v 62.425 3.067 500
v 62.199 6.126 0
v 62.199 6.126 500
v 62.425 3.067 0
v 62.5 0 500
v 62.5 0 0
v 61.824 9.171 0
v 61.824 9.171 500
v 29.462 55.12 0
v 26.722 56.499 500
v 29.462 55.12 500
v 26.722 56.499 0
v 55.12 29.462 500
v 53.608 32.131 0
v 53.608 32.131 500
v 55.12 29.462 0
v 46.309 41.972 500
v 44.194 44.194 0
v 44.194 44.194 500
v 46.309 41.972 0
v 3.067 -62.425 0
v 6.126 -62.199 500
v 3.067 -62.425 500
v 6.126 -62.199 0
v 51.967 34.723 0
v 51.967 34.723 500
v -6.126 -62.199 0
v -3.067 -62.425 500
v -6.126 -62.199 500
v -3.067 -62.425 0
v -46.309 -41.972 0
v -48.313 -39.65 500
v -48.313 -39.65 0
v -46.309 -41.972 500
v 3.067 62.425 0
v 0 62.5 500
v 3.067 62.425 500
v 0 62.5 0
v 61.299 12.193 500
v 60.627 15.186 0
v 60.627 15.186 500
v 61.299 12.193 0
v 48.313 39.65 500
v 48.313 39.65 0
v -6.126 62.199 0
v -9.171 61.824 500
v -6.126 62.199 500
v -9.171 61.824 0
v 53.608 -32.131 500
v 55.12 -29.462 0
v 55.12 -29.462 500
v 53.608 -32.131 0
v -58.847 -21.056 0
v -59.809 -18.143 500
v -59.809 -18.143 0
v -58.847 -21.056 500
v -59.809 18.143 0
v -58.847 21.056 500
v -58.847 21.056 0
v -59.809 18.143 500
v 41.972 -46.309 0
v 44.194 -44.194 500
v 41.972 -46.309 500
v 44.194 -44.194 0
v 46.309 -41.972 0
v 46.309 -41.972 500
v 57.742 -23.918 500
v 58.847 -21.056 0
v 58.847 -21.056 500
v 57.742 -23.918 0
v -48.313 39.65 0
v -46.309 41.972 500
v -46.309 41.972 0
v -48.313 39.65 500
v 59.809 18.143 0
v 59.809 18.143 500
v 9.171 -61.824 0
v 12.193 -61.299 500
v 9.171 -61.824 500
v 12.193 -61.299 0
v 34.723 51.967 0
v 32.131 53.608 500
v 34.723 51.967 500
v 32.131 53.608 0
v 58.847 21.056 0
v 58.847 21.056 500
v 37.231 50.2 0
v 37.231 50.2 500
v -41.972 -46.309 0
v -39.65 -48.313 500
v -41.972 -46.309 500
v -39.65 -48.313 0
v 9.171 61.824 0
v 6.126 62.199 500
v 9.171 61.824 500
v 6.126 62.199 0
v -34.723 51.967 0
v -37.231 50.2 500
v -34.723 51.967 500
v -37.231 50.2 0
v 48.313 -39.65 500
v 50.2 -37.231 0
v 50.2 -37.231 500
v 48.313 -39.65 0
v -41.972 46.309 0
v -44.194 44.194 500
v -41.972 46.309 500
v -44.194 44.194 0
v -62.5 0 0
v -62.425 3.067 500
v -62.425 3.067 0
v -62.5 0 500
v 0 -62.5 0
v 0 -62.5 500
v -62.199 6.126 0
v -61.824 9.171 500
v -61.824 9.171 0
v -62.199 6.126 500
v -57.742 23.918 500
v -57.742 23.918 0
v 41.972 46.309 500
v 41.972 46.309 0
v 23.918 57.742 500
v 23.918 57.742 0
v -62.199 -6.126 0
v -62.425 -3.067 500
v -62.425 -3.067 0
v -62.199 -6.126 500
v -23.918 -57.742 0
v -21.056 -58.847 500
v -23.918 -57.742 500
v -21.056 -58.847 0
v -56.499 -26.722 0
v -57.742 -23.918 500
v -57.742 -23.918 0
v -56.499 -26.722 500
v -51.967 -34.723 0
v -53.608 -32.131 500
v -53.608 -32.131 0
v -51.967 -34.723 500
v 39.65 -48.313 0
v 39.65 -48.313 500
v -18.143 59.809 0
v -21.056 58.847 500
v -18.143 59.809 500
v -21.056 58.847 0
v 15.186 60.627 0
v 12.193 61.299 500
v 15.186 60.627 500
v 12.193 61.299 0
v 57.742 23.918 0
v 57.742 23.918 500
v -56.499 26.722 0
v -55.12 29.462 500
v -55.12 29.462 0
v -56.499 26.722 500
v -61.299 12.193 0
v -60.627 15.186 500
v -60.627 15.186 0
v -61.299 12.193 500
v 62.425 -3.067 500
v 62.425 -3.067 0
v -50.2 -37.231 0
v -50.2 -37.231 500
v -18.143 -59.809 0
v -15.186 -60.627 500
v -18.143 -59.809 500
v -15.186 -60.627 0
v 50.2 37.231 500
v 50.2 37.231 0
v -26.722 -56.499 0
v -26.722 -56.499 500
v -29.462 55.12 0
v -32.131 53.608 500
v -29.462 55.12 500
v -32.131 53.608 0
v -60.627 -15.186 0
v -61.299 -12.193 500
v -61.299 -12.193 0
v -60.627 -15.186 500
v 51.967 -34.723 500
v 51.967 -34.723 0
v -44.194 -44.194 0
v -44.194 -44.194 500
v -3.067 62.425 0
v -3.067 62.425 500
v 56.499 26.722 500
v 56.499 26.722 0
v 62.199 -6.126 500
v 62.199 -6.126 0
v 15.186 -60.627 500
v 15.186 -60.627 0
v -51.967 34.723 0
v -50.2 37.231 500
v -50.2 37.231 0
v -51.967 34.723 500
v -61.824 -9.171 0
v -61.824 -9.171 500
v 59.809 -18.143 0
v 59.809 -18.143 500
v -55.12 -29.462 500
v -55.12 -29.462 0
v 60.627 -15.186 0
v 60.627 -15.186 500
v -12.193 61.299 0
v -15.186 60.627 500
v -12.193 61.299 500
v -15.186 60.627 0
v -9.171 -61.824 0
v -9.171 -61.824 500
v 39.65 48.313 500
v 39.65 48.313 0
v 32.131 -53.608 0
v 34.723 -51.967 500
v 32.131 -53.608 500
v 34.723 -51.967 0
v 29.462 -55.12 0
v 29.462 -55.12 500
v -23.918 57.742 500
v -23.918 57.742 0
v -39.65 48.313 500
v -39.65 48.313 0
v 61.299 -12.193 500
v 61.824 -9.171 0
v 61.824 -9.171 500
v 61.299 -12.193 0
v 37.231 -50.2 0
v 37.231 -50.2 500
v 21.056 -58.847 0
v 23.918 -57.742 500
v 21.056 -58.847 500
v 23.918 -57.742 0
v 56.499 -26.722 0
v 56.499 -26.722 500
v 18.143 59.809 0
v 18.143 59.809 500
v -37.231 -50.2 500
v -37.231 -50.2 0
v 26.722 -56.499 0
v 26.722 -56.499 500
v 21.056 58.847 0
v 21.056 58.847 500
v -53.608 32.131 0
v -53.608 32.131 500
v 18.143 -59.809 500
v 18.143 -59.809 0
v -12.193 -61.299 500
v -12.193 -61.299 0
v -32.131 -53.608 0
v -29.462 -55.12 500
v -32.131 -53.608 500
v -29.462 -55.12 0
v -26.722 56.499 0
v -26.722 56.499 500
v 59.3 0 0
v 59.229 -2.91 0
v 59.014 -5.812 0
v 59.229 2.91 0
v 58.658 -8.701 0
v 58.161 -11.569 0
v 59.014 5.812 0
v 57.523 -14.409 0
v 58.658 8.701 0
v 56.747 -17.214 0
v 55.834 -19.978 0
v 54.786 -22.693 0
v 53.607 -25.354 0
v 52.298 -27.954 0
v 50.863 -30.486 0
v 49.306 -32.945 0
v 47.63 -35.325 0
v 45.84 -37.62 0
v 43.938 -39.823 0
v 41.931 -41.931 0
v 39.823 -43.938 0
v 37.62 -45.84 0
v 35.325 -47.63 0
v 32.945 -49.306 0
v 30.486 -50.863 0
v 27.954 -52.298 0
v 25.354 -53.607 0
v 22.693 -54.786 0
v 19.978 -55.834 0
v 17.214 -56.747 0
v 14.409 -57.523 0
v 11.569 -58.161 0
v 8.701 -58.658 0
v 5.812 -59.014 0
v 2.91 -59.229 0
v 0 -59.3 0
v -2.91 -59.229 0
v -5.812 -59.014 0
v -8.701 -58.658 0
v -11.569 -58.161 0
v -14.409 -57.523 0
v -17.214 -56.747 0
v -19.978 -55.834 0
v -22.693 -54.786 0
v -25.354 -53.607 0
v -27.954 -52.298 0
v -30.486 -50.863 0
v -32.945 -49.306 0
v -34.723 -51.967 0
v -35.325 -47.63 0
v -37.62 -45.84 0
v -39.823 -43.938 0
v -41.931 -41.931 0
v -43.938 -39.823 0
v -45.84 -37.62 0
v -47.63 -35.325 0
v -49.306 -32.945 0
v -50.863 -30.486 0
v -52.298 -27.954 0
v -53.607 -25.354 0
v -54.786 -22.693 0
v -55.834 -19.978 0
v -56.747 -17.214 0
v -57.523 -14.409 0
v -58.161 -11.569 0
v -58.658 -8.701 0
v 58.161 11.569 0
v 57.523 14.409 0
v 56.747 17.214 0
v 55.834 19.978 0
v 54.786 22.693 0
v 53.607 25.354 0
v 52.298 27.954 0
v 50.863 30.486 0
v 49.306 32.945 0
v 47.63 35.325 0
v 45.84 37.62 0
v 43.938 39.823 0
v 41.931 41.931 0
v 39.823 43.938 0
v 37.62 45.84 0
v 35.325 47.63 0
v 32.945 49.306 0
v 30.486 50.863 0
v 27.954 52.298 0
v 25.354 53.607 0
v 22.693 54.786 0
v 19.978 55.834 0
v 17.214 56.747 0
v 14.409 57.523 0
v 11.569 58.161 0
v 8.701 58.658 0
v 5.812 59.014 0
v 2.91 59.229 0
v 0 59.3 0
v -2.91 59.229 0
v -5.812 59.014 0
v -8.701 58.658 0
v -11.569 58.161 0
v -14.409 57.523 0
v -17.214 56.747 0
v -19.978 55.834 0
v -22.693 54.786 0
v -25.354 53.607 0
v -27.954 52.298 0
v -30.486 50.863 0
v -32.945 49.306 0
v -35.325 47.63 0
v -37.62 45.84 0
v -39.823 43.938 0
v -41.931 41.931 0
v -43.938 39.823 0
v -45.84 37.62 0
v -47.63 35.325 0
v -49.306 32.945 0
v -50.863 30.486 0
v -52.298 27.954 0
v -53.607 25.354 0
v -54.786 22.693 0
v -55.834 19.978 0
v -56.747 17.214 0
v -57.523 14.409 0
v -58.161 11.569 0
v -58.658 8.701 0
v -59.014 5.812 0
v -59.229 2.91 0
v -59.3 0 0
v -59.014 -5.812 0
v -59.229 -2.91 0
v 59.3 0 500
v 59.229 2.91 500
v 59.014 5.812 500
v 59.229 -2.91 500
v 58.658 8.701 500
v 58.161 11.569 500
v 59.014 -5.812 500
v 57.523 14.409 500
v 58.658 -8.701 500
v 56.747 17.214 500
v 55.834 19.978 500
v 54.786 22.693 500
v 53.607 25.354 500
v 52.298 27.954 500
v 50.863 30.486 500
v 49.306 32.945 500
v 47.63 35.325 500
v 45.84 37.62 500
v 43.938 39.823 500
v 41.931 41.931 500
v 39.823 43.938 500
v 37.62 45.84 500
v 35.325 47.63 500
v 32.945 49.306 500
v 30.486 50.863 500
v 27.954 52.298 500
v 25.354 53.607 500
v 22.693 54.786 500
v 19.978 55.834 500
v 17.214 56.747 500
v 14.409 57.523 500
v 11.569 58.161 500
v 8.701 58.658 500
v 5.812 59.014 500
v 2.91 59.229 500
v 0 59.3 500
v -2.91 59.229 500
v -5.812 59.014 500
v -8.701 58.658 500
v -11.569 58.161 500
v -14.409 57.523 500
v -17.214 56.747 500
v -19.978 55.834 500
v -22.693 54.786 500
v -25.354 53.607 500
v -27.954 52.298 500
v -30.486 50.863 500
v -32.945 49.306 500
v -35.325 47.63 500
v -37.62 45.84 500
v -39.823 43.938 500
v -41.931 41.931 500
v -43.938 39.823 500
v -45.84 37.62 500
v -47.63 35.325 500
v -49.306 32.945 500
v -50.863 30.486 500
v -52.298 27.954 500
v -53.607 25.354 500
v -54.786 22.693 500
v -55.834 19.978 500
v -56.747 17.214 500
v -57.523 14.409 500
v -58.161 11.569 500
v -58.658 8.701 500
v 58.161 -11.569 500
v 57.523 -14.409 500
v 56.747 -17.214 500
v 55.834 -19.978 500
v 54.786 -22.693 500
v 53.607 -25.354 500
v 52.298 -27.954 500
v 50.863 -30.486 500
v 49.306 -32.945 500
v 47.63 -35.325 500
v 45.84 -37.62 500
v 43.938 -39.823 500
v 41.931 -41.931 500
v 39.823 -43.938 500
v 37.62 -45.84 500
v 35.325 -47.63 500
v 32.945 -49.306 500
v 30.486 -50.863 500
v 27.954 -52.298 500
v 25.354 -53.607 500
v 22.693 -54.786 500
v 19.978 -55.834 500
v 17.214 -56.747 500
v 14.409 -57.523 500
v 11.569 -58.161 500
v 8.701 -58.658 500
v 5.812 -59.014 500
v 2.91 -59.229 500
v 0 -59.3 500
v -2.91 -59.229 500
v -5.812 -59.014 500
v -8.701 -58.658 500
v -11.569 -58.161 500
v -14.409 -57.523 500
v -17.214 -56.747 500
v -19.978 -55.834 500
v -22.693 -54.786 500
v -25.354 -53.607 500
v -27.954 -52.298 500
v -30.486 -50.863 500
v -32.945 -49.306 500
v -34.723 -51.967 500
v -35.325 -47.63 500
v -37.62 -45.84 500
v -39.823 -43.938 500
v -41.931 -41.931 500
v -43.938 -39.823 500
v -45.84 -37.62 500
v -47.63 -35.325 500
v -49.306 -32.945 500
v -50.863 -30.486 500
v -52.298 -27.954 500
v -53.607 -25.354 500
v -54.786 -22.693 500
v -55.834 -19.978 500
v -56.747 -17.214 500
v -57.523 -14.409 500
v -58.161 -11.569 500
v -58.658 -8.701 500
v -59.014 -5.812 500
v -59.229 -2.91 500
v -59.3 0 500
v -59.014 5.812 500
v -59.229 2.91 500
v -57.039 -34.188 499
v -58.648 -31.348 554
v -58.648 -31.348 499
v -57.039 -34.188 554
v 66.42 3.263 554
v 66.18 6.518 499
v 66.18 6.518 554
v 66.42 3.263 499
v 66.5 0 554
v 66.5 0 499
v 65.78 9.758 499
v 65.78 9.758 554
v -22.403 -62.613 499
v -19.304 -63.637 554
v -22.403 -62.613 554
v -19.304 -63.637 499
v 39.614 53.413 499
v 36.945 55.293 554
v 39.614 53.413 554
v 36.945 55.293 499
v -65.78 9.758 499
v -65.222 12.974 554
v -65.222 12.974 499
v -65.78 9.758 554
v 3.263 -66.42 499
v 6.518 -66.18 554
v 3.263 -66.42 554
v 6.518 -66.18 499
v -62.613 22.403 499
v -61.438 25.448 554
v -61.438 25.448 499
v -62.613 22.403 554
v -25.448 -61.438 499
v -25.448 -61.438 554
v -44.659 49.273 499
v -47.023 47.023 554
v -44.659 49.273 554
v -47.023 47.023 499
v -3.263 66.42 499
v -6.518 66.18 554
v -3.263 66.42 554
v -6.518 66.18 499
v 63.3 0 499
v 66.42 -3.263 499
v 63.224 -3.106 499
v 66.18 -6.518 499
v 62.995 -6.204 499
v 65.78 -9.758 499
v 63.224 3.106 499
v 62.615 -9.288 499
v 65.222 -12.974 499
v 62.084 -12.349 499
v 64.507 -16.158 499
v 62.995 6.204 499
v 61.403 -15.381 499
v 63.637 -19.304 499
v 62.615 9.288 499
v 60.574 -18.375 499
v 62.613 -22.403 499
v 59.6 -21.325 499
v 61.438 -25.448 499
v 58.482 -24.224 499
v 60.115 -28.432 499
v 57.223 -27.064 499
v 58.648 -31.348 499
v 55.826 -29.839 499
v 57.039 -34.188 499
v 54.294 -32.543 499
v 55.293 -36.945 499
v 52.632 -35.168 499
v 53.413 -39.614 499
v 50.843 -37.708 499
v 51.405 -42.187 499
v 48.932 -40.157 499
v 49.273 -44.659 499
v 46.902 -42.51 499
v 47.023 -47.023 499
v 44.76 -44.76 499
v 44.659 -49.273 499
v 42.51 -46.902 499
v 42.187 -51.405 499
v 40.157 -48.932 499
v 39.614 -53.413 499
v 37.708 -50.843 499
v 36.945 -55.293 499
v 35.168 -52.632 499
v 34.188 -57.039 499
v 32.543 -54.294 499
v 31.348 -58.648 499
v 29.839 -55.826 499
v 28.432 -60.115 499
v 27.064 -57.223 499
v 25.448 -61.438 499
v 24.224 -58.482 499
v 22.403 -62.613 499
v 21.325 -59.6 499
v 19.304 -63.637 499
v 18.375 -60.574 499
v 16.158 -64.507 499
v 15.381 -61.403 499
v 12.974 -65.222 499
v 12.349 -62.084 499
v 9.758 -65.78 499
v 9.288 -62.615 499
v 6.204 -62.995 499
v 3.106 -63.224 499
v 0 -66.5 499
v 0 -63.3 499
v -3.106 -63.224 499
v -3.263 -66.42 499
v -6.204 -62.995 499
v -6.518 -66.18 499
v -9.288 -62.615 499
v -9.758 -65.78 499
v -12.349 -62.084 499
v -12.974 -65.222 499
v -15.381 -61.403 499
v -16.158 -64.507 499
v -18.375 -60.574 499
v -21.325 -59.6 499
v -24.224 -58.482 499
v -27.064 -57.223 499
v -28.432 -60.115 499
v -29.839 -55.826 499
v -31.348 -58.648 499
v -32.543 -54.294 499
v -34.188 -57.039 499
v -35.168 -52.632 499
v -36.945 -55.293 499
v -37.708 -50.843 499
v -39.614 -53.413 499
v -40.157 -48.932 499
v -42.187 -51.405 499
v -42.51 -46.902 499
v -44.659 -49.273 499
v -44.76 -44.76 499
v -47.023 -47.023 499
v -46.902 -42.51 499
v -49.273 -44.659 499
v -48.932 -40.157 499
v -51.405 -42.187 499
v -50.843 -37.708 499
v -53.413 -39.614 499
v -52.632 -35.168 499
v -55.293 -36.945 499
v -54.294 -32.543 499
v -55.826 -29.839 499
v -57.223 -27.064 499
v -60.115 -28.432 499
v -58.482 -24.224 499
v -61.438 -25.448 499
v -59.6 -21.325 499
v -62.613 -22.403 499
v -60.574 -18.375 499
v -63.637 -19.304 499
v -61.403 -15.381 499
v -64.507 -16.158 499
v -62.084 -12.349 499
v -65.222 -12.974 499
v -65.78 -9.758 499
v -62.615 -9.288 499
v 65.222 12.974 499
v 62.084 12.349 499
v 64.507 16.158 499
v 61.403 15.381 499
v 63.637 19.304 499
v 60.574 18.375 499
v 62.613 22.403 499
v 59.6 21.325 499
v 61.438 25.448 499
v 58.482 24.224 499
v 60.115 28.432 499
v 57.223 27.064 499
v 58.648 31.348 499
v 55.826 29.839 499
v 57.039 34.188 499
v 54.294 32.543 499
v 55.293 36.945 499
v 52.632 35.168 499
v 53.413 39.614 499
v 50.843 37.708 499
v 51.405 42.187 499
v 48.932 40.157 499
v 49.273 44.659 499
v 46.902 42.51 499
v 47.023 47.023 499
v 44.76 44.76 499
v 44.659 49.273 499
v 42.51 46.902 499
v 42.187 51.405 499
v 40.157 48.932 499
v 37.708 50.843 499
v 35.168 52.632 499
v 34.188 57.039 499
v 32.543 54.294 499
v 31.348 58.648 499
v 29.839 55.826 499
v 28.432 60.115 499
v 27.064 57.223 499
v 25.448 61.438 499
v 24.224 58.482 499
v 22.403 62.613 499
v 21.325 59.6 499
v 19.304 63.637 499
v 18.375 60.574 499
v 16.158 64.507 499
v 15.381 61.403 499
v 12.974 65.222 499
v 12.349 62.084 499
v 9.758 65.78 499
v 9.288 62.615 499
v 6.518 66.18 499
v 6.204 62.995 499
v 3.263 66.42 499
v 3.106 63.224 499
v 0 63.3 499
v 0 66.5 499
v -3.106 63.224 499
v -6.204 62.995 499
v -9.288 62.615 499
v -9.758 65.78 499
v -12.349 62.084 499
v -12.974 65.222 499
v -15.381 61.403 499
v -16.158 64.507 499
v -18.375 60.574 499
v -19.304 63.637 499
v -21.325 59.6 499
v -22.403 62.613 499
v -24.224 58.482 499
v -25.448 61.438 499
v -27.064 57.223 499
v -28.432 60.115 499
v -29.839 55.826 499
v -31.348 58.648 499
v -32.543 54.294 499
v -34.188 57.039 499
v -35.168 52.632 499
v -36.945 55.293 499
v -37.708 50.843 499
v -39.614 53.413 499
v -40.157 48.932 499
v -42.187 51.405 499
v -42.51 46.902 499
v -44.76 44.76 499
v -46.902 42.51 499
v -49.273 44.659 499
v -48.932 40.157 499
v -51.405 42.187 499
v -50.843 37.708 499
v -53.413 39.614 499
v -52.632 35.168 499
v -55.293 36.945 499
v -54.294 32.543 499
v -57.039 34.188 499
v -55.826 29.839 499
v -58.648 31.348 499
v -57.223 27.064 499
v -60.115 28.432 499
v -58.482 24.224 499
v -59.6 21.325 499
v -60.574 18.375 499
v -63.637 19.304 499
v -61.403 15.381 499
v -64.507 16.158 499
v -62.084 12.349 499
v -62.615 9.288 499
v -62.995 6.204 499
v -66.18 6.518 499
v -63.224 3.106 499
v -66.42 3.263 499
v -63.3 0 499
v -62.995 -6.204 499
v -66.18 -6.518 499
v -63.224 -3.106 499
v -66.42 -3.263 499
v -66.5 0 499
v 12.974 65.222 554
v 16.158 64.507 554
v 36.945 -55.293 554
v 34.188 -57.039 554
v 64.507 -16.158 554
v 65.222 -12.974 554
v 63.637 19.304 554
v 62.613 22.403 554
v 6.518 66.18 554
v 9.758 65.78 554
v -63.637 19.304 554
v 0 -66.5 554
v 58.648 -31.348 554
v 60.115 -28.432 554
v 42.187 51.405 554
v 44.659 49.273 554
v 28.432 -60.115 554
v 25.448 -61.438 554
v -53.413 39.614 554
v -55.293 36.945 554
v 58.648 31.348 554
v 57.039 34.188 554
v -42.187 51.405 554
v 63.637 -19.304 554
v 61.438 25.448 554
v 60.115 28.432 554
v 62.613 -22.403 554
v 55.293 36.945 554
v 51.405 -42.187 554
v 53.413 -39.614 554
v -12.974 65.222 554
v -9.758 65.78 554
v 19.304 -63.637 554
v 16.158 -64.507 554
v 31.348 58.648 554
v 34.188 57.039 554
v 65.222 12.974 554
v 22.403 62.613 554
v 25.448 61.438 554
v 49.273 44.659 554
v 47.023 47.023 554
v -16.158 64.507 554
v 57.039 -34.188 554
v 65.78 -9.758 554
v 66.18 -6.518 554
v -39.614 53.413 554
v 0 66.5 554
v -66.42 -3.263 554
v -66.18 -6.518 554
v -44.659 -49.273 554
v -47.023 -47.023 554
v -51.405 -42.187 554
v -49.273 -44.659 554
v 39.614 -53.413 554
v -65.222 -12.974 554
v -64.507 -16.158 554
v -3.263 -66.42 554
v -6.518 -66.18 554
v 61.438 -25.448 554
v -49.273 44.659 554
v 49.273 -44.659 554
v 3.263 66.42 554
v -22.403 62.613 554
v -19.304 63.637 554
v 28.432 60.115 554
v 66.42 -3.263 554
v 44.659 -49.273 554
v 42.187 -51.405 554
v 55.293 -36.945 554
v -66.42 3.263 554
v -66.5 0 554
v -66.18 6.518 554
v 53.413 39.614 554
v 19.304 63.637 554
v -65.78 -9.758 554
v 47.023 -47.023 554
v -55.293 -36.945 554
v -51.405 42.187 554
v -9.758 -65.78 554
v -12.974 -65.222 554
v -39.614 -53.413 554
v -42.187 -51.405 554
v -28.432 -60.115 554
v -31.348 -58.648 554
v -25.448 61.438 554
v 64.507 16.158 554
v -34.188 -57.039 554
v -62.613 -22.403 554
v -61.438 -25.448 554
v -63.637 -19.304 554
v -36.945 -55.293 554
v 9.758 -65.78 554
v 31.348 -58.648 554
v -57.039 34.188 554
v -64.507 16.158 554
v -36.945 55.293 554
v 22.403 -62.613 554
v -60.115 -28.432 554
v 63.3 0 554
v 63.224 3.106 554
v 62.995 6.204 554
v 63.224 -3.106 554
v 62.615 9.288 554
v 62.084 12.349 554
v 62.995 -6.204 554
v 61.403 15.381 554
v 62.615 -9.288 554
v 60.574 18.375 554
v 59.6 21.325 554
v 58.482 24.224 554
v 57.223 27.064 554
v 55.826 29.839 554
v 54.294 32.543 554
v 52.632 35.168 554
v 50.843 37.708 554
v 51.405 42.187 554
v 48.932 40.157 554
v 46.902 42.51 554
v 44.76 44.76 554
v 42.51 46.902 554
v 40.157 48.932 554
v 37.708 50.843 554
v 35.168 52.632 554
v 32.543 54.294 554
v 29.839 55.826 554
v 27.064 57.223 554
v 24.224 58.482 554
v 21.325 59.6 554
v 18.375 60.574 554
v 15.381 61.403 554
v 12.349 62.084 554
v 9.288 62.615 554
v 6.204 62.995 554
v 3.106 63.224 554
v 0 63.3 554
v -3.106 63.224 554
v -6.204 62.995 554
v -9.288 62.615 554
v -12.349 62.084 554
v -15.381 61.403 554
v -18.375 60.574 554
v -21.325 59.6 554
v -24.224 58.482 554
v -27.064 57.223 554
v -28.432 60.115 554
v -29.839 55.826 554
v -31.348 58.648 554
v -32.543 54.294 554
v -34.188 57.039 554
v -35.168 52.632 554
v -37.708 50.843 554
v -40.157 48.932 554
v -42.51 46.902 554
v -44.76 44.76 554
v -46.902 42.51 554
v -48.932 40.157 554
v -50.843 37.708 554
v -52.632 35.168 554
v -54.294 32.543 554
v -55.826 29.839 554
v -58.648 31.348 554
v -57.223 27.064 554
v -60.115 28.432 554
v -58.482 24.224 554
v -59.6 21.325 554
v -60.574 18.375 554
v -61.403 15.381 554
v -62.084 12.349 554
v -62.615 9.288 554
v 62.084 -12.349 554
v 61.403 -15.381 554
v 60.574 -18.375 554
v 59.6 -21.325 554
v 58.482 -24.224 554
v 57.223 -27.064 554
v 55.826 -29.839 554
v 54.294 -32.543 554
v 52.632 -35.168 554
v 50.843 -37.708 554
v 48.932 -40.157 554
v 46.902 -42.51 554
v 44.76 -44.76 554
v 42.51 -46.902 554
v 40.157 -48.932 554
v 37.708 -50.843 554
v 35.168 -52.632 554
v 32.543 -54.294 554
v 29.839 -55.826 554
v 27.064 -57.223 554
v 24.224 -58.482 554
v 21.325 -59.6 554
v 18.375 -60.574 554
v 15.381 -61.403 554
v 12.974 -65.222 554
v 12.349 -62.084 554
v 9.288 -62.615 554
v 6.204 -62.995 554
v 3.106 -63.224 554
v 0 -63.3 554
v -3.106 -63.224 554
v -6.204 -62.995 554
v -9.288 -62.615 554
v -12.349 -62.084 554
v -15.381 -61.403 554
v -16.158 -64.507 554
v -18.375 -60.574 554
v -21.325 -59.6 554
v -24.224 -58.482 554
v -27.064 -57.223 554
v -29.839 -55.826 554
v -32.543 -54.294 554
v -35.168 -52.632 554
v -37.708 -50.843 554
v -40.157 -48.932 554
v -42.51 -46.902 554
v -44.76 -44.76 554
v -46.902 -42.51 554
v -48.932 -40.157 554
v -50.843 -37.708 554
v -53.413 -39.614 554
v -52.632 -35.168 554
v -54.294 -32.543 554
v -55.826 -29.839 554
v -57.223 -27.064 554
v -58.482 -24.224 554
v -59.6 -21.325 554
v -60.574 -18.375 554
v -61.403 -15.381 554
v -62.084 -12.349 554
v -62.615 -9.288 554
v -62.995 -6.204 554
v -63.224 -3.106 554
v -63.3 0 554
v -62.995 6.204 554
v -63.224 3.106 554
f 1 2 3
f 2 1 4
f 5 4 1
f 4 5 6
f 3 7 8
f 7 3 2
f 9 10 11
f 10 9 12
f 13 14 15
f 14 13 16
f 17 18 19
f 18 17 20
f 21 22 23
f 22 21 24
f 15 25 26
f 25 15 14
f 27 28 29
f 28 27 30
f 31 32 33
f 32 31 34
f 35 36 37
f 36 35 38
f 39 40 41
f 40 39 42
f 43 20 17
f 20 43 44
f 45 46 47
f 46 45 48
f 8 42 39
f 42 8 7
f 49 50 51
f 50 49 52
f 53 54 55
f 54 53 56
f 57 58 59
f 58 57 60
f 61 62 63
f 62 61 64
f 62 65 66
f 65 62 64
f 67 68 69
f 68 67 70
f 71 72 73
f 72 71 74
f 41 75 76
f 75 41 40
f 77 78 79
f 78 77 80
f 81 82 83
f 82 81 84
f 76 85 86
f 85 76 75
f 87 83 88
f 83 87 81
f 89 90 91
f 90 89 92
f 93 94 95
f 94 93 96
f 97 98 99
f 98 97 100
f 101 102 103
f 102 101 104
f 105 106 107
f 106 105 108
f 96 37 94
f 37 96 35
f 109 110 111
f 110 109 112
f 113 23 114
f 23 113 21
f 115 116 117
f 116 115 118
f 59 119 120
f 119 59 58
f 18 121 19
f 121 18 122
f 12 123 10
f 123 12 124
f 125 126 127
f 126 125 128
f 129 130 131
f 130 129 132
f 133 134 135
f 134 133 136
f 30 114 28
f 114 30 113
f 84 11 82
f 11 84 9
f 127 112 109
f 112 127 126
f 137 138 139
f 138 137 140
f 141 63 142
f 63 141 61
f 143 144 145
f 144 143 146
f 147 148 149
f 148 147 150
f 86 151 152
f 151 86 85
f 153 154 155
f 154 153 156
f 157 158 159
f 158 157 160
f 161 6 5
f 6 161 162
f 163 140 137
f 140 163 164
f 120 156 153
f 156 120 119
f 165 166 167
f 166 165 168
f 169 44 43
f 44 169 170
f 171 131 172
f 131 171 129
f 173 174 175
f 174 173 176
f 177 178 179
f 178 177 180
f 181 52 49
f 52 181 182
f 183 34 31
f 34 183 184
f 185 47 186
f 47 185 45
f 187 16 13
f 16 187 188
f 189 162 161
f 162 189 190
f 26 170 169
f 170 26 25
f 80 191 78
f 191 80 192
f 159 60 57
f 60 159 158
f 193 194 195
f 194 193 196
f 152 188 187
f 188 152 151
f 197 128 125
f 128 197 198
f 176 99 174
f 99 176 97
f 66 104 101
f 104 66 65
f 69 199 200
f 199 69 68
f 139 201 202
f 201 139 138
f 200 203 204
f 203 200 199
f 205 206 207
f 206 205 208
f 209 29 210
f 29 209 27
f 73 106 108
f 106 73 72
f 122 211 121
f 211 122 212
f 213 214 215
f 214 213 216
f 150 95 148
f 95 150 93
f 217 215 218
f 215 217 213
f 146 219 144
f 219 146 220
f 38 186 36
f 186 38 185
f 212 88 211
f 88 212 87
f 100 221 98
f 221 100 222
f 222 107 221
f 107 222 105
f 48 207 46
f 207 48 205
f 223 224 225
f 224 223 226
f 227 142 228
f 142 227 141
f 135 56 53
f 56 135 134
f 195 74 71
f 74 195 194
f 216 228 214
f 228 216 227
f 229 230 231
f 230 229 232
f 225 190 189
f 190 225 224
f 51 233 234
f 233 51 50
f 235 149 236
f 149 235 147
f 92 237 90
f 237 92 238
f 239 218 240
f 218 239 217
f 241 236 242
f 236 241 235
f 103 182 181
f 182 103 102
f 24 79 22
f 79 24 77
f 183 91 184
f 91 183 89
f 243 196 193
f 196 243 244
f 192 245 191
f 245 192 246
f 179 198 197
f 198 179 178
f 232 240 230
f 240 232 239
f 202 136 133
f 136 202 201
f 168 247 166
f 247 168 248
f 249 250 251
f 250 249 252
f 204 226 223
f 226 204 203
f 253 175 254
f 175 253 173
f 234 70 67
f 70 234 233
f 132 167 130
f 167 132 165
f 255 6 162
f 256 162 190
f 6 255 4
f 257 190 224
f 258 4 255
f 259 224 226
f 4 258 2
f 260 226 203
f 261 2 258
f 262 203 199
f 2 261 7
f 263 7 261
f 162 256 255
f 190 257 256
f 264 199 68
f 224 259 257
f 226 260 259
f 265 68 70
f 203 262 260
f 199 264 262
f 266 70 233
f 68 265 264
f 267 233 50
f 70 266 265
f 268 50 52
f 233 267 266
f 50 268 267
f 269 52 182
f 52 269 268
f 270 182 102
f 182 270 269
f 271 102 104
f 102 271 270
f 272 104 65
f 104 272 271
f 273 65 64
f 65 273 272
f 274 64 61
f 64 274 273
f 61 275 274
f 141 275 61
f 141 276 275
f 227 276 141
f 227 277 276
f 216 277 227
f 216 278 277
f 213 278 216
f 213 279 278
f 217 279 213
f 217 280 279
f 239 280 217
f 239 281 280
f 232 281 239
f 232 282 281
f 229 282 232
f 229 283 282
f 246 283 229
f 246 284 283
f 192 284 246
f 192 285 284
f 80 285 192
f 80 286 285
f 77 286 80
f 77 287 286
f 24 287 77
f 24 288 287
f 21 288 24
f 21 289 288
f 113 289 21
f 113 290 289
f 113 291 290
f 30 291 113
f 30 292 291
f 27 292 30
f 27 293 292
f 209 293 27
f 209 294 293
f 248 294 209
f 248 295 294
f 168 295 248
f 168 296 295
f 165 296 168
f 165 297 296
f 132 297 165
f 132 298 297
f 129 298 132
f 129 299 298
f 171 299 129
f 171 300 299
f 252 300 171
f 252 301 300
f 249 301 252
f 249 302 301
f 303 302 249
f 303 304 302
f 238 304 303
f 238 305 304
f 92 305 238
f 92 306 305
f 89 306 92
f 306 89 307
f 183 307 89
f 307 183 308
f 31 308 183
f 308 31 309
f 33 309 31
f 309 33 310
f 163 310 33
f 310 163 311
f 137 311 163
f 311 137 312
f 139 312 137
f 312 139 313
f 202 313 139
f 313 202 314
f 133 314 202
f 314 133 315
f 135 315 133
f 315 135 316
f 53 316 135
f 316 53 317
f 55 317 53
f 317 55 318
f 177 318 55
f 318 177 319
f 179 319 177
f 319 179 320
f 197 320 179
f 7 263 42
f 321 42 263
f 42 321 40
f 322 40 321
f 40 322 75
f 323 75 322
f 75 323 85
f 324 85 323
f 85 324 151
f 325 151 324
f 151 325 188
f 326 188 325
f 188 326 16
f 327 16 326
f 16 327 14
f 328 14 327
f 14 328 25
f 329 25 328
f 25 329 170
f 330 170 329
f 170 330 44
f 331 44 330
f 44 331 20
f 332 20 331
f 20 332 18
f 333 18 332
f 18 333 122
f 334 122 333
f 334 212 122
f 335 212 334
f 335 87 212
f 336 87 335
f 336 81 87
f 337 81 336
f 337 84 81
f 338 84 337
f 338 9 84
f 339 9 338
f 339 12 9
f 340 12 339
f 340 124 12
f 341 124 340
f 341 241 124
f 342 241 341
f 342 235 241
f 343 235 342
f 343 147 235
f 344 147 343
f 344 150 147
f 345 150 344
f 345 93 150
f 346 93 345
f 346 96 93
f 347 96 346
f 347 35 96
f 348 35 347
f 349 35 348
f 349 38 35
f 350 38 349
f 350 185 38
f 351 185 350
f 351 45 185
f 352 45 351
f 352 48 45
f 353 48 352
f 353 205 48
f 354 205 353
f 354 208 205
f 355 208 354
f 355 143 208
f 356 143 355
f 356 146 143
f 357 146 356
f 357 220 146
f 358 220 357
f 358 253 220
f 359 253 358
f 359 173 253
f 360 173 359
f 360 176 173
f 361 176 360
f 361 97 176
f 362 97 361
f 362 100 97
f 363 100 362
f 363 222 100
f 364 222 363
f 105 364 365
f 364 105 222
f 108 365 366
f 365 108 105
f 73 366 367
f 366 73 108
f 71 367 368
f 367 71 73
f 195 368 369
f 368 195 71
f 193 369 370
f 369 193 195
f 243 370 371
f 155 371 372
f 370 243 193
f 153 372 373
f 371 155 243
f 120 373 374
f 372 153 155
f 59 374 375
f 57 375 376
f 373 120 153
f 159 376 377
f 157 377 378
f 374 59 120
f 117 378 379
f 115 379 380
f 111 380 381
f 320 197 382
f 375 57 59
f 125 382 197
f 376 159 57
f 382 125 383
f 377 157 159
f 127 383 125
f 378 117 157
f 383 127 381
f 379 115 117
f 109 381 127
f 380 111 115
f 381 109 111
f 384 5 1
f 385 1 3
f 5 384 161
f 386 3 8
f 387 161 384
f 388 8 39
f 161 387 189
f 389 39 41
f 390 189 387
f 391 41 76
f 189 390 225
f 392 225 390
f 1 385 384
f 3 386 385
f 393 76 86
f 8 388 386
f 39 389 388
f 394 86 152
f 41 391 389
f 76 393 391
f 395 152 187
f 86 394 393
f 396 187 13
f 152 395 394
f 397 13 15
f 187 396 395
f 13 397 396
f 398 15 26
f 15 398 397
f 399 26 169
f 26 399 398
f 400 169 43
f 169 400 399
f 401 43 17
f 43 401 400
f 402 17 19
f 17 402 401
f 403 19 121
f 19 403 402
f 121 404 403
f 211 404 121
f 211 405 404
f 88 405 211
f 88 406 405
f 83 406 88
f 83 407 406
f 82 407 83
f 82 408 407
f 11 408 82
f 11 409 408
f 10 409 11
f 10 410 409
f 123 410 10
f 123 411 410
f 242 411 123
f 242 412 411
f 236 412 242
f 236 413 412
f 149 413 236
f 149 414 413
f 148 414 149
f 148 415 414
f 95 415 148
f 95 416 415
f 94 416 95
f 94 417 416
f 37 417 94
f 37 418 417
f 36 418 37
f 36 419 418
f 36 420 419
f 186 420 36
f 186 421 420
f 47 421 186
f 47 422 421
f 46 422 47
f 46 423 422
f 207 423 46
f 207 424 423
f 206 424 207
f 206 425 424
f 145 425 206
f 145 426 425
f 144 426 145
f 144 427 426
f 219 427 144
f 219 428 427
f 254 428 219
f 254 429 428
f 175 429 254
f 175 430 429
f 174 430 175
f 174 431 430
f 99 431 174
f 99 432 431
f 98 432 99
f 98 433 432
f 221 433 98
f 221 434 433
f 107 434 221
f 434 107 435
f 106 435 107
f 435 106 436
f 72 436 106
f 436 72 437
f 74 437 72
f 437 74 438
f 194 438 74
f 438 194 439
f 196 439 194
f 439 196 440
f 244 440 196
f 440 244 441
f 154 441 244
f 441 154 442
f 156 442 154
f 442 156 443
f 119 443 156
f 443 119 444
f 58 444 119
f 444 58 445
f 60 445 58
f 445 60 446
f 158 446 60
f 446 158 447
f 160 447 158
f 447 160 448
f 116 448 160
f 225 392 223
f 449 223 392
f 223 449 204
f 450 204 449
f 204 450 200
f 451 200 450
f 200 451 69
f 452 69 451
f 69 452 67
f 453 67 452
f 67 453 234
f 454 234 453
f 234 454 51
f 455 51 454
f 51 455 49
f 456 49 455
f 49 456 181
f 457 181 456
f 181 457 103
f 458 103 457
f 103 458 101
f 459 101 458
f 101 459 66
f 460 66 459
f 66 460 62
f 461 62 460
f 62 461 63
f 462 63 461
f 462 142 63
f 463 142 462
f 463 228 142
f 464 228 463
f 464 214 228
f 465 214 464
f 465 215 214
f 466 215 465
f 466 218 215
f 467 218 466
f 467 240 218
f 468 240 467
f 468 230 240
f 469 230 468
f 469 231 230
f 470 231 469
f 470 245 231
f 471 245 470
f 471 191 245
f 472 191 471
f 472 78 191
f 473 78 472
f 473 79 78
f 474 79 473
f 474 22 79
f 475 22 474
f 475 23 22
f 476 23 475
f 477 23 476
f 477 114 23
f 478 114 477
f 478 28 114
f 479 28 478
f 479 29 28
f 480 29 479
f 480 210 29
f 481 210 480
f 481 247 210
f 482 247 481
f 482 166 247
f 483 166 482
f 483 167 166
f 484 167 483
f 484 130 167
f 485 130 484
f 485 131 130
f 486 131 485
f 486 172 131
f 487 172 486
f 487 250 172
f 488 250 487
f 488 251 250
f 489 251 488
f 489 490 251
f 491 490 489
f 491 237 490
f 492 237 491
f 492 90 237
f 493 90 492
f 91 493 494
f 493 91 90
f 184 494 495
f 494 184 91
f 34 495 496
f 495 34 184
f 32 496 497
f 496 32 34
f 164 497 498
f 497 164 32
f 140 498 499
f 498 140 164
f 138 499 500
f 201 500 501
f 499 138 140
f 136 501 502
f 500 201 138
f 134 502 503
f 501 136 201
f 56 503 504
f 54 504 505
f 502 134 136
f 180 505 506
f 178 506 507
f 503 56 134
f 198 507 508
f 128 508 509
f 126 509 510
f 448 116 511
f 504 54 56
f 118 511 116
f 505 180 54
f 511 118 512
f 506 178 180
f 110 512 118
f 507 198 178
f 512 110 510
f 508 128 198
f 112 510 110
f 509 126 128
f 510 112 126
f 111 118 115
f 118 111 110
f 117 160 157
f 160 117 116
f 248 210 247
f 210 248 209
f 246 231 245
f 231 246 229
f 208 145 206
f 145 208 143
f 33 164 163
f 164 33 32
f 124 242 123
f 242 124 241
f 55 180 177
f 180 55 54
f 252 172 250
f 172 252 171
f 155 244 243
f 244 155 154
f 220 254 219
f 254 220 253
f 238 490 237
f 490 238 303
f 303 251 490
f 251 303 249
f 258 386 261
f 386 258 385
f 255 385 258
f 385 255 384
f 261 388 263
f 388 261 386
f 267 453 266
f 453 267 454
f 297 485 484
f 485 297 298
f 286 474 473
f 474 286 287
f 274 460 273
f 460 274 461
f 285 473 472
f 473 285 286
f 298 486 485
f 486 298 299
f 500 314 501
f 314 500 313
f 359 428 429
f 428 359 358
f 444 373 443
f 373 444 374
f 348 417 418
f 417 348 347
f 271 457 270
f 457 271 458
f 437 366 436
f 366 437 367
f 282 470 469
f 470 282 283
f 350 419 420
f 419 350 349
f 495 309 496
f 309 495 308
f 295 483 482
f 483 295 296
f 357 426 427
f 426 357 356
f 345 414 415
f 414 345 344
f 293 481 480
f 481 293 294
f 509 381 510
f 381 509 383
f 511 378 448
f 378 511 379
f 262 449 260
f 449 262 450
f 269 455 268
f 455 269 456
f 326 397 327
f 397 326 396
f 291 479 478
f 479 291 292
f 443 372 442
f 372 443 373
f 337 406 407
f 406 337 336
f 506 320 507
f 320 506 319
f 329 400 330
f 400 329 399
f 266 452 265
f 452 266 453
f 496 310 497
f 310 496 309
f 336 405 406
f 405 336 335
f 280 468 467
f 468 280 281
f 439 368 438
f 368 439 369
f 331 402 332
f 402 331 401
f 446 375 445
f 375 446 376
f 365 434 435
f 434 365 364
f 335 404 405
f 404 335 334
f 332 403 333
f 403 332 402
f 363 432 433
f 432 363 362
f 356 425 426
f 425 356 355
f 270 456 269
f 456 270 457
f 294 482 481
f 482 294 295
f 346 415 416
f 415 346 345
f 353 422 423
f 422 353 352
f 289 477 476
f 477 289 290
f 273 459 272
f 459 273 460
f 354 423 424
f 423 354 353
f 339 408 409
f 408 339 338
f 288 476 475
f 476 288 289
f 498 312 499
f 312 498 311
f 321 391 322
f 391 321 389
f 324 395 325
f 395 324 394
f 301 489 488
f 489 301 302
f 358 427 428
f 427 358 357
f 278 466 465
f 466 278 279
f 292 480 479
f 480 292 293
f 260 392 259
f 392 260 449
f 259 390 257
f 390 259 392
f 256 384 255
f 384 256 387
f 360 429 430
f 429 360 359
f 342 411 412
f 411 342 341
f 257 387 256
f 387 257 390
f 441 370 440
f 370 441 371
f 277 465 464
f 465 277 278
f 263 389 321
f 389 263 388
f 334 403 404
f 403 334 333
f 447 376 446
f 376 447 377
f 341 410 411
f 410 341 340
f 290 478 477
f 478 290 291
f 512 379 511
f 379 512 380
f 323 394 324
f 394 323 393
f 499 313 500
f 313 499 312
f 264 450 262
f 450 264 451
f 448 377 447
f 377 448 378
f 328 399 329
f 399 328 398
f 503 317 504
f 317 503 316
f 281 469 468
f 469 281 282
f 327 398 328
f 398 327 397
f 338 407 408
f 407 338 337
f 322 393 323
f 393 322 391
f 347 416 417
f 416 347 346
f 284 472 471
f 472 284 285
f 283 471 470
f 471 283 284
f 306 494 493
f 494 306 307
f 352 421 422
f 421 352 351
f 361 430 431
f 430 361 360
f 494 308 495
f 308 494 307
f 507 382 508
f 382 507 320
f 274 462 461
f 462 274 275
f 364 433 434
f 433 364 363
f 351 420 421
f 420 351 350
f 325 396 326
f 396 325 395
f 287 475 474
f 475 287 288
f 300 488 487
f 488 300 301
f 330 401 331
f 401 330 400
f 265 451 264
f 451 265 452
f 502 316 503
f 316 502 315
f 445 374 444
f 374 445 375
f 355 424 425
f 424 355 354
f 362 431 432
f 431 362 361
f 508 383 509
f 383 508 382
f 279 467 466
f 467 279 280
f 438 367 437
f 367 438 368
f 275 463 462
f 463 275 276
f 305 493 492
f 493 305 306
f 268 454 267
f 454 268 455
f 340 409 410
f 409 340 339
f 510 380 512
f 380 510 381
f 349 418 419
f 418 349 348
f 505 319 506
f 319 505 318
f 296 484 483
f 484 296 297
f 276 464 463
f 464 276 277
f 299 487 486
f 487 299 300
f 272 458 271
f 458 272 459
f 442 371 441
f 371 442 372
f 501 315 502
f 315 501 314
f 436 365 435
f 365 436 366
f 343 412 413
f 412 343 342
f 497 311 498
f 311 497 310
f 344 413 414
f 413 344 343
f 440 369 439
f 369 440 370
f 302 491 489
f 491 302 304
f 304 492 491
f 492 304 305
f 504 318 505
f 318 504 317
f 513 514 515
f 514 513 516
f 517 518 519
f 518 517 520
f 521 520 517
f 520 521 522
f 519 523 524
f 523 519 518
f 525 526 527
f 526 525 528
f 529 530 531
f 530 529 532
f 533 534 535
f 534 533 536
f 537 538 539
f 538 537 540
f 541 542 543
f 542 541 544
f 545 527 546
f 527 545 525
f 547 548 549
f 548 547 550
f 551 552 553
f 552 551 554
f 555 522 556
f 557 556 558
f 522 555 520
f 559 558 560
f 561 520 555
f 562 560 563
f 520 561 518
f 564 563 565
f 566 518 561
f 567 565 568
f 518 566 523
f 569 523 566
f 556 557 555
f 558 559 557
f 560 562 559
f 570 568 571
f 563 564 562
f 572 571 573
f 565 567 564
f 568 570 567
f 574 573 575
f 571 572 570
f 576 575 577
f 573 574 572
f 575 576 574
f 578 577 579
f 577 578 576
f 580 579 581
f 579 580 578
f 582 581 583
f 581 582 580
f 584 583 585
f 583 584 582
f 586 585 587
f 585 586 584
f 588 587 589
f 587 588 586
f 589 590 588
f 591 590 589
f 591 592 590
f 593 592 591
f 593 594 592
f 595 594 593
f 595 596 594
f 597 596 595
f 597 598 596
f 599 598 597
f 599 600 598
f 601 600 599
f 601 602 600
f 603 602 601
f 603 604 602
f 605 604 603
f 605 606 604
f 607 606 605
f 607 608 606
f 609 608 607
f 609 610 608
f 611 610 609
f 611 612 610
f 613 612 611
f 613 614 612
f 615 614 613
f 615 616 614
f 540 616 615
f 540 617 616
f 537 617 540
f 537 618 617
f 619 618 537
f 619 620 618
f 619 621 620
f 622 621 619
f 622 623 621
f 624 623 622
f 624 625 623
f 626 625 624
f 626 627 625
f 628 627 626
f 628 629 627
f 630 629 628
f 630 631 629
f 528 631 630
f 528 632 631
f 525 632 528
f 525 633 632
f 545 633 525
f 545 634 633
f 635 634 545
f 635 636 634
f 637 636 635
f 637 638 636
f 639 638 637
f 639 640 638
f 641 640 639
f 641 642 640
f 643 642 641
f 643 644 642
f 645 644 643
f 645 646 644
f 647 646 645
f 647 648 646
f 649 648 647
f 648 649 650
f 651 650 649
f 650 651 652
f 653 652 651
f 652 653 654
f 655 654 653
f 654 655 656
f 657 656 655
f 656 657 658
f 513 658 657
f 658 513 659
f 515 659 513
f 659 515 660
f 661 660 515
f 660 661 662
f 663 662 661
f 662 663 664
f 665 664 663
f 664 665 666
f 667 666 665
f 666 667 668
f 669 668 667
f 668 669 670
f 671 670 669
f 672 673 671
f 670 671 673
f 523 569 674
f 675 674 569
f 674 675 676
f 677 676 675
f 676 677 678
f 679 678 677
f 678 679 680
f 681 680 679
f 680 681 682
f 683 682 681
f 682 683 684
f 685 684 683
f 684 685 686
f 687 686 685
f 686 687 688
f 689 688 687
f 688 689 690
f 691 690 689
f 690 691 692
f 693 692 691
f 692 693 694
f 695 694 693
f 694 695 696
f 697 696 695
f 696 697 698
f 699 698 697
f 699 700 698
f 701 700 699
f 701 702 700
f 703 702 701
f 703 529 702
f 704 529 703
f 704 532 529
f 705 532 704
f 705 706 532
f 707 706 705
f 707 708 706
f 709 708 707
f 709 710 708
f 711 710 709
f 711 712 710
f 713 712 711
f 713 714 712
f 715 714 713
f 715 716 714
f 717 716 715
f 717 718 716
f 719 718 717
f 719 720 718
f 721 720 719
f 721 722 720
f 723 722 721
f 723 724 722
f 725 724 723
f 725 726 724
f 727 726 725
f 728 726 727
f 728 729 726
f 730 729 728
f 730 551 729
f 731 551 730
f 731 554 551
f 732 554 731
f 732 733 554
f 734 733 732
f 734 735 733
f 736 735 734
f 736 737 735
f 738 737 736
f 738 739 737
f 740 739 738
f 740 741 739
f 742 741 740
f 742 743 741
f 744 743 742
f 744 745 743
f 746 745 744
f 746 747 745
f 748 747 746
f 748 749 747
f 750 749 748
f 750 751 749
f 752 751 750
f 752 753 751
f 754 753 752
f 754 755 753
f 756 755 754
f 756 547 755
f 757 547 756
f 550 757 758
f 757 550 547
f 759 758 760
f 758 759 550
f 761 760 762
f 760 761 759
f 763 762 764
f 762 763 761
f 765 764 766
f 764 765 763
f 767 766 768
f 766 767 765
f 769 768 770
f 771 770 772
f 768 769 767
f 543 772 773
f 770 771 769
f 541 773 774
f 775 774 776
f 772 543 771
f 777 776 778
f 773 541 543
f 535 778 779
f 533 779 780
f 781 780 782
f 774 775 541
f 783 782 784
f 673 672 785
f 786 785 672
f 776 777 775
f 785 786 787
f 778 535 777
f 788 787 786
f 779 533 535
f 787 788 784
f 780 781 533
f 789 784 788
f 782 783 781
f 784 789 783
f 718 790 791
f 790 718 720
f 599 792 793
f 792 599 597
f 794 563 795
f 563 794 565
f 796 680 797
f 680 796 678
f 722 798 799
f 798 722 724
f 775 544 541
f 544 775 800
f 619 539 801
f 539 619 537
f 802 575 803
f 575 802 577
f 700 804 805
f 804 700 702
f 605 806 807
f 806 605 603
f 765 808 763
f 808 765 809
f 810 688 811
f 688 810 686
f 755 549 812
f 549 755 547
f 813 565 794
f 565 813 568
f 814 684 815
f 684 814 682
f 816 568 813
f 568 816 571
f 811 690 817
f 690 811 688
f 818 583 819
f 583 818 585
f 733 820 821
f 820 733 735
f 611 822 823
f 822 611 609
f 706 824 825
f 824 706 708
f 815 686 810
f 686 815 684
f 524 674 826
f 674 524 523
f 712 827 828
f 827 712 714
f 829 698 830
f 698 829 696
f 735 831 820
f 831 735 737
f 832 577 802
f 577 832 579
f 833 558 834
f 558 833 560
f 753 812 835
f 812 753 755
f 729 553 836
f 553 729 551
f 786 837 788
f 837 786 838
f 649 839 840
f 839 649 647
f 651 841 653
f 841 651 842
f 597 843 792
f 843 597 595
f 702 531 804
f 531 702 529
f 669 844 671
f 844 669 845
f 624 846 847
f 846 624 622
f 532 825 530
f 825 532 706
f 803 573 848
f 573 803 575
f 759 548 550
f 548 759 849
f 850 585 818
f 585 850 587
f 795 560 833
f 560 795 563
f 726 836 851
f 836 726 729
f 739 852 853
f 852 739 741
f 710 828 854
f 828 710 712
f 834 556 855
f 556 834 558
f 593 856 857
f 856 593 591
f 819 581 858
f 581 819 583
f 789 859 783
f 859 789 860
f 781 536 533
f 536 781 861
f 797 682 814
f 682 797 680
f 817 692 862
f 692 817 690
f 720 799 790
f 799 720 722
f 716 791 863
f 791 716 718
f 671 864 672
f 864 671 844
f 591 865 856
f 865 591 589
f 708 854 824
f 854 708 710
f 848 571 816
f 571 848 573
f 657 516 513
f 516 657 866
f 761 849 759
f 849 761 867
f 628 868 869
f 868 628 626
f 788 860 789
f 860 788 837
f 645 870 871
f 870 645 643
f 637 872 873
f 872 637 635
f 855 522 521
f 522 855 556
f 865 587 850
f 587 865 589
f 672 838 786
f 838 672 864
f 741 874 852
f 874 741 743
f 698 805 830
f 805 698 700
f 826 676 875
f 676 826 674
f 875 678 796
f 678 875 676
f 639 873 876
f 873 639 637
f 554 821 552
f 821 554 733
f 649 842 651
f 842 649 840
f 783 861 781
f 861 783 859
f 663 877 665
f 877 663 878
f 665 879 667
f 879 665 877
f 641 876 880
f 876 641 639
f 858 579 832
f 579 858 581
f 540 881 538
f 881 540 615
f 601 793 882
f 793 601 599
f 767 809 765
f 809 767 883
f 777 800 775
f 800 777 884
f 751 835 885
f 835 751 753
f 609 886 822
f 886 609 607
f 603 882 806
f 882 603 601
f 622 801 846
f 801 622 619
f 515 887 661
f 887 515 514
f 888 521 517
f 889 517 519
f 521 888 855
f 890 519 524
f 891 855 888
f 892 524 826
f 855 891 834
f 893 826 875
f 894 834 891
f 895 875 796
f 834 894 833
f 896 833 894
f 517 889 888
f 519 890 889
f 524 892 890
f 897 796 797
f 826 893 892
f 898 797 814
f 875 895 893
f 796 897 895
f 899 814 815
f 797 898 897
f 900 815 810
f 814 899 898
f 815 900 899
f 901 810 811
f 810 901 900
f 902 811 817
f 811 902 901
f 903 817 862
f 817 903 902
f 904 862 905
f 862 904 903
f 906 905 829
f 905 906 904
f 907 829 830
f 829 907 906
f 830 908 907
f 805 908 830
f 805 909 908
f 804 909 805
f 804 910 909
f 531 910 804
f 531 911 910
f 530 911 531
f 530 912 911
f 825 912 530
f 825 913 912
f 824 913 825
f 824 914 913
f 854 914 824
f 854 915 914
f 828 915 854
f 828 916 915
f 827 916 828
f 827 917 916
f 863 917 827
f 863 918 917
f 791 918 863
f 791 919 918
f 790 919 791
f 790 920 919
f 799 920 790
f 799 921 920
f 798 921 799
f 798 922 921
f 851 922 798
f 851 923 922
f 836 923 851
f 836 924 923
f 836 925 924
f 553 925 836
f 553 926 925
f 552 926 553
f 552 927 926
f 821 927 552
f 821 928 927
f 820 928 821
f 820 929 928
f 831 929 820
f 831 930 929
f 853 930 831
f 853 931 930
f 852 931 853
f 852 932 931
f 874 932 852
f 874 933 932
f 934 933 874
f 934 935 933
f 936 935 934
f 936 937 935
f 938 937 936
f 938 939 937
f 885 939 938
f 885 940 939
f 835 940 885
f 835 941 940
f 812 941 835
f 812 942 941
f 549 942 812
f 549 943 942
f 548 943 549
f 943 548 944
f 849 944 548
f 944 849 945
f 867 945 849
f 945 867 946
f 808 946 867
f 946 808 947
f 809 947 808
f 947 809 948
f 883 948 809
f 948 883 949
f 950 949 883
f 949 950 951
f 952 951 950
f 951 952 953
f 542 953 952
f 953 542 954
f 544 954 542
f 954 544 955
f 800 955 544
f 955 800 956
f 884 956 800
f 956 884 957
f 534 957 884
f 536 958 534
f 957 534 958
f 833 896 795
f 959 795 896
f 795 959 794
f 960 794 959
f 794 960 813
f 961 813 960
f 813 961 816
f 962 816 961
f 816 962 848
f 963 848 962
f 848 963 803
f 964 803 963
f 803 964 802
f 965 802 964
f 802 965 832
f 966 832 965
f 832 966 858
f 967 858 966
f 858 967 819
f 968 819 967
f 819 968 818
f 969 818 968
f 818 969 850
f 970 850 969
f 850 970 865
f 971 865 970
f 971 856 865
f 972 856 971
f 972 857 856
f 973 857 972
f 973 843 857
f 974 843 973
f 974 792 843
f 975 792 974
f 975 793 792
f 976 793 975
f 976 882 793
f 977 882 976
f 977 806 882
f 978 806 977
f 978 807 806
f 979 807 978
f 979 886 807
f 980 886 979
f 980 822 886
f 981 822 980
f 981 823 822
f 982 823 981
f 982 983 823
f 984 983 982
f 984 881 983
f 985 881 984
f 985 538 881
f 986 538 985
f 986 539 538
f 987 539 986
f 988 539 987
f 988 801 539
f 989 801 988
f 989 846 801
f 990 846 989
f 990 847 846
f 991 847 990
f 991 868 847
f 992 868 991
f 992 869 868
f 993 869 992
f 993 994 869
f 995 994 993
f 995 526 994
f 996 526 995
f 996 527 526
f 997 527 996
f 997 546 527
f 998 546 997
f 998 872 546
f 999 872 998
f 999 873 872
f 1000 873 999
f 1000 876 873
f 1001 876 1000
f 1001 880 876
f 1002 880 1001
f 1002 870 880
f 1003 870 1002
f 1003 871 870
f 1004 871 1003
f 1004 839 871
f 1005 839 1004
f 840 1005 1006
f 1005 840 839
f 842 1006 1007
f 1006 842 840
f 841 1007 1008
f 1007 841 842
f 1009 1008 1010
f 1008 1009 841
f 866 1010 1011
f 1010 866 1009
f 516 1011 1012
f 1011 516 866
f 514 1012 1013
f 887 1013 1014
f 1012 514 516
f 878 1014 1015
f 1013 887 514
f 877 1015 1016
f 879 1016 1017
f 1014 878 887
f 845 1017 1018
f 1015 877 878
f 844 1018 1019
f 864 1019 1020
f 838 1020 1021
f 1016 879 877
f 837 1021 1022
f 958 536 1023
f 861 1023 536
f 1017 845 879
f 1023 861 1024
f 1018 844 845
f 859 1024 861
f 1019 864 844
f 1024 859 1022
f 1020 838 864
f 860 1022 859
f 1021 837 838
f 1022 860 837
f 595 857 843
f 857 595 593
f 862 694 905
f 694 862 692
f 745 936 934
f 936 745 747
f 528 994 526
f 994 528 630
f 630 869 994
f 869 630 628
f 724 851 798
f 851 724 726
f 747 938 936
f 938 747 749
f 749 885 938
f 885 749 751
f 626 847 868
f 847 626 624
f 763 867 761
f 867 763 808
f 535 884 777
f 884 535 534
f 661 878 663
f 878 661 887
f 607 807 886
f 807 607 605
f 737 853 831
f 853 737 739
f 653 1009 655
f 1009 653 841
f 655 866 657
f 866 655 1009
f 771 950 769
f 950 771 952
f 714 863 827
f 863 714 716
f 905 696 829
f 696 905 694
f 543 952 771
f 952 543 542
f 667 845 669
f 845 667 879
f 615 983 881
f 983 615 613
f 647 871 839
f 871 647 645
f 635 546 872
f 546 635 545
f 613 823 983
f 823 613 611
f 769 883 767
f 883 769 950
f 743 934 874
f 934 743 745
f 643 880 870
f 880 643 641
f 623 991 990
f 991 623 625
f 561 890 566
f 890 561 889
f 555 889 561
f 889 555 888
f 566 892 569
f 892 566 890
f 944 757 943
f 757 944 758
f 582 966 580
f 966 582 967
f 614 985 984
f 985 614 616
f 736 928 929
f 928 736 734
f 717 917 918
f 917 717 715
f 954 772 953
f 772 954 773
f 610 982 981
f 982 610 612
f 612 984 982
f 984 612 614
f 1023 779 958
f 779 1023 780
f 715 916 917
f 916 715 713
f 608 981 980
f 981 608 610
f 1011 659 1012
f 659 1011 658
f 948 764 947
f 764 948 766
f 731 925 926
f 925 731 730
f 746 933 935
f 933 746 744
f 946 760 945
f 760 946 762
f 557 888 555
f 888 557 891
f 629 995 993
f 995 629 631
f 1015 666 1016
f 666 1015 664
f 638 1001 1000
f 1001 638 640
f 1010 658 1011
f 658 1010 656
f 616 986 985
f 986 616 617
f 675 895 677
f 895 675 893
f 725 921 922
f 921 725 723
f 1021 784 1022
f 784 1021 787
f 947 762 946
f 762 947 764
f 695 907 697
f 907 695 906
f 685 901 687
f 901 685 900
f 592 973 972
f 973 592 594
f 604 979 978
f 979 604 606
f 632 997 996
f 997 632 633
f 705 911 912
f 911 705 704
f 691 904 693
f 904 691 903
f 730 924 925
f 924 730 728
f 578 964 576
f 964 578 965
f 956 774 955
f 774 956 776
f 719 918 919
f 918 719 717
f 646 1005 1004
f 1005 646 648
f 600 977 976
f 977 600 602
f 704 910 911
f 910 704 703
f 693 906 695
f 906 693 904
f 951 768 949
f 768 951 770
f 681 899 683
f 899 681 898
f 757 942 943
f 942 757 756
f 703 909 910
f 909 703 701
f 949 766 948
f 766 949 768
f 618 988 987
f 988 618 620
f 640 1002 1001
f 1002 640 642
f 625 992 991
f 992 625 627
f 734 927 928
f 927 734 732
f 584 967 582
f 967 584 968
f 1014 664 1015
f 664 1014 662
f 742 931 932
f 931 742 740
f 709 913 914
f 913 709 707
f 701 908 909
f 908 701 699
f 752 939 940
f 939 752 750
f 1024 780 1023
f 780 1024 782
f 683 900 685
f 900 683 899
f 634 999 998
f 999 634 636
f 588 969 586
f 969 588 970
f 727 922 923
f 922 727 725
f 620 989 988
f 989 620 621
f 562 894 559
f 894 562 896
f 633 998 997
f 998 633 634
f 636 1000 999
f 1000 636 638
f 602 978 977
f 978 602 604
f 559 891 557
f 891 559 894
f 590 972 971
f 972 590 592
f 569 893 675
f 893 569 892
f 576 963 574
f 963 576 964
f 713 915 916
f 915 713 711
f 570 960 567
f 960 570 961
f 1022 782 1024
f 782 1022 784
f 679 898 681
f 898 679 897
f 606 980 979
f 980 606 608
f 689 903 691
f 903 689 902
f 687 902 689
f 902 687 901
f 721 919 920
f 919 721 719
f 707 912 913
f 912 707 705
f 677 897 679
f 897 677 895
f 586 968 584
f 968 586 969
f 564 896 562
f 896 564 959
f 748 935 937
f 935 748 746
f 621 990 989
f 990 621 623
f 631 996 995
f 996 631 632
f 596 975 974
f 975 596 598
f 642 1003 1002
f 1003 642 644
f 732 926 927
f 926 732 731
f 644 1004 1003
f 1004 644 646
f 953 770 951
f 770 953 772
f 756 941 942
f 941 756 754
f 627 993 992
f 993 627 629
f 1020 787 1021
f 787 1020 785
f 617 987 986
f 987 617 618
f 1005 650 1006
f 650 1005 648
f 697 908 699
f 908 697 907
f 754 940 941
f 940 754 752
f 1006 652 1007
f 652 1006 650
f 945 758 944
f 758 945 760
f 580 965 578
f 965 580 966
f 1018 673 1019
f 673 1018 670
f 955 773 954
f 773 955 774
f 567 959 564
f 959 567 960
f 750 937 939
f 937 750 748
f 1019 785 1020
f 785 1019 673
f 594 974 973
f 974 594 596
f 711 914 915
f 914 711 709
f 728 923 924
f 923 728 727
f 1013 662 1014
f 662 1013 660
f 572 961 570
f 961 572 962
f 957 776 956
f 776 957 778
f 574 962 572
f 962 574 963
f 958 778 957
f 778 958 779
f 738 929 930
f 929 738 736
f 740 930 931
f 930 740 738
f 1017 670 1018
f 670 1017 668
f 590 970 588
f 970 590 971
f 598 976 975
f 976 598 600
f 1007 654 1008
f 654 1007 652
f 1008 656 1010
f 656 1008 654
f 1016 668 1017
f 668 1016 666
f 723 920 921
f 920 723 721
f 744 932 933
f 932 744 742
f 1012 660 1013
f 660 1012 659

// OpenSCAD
// HT 125 pipe 500 mm (single connected solid)

// Parameters
nominal_diameter_mm = 125; //[60:250:1]
length_mm = 500; //[250:1000:1]
wall_thickness_mm = 3.2; //[1.6:6.4:0.1]
fitting_length_mm = 55; //[30:110:1]
fitting_radial_thickness_mm = 4; //[2:10:0.5]
fitting_inner_clearance_mm = 0.8; //[0.2:2:0.1]
fitting_stop_thickness_mm = 3; //[1:8:0.5]
fitting_stop_depth_mm = 12; //[6:25:1]
overlap_mm = 1; //[0.5:2:0.1]

$fn = 128;

// Derived radii
outer_r = nominal_diameter_mm/2;
inner_r = outer_r - wall_thickness_mm;

// Socket (muffe) radii
socket_outer_r = outer_r + fitting_radial_thickness_mm;
socket_inner_r = outer_r + fitting_inner_clearance_mm;

// Z positions (formulas, no arbitrary offsets)
pipe_z0 = 0;
pipe_z1 = length_mm;

socket_z0 = pipe_z1 - overlap_mm;                 // overlaps into pipe to ensure connectivity
socket_z1 = socket_z0 + fitting_length_mm;

stop_z0 = socket_z0 + fitting_stop_depth_mm;      // internal stop ring position
stop_z1 = stop_z0 + fitting_stop_thickness_mm;

module ht_pipe() {
  color([0.85, 0.85, 0.8])
  union() {
    // Main pipe (hollow)
    difference() {
      cylinder(h=length_mm, r=outer_r, center=false);
      translate([0,0,-overlap_mm])
        cylinder(h=length_mm + 2*overlap_mm, r=inner_r, center=false);
    }

    // End socket (hollow with internal stop ring)
    difference() {
      // Outer socket body
      translate([0,0,socket_z0])
        cylinder(h=fitting_length_mm, r=socket_outer_r, center=false);

      // Inner void of socket
      translate([0,0,socket_z0 - overlap_mm])
        cylinder(h=fitting_length_mm + 2*overlap_mm, r=socket_inner_r, center=false);

      // Create the internal stop ring by "un-cutting" a thin band:
      // subtract everything except the stop band by adding back a blocker subtraction
      // (implemented as subtracting a larger void above and below the stop band)
      // Below stop: already void; Above stop: void continues. We remove void only in stop band by subtracting void in two parts.
      // Part 1: remove void below stop band (no effect, already void) - kept for clarity
      translate([0,0,socket_z0 - overlap_mm])
        cylinder(h=(stop_z0 - socket_z0) + overlap_mm, r=socket_inner_r, center=false);

      // Part 2: remove void above stop band
      translate([0,0,stop_z1 - overlap_mm])
        cylinder(h=(socket_z1 - stop_z1) + 2*overlap_mm, r=socket_inner_r, center=false);
    }

    // Add back the stop ring solid (ensures it exists as material)
    // Ring occupies the socket wall thickness region between socket_inner_r and socket_outer_r,
    // but we only need the inner stop lip: between socket_inner_r and socket_inner_r + fitting_stop_thickness_mm radial? No.
    // Stop is axial thickness; radial is the socket wall. So we add a short tube segment of socket wall at stop band.
    translate([0,0,stop_z0])
      difference() {
        cylinder(h=fitting_stop_thickness_mm, r=socket_outer_r, center=false);
        translate([0,0,-overlap_mm])
          cylinder(h=fitting_stop_thickness_mm + 2*overlap_mm, r=socket_inner_r, center=false);
      }
  }
}

ht_pipe();
